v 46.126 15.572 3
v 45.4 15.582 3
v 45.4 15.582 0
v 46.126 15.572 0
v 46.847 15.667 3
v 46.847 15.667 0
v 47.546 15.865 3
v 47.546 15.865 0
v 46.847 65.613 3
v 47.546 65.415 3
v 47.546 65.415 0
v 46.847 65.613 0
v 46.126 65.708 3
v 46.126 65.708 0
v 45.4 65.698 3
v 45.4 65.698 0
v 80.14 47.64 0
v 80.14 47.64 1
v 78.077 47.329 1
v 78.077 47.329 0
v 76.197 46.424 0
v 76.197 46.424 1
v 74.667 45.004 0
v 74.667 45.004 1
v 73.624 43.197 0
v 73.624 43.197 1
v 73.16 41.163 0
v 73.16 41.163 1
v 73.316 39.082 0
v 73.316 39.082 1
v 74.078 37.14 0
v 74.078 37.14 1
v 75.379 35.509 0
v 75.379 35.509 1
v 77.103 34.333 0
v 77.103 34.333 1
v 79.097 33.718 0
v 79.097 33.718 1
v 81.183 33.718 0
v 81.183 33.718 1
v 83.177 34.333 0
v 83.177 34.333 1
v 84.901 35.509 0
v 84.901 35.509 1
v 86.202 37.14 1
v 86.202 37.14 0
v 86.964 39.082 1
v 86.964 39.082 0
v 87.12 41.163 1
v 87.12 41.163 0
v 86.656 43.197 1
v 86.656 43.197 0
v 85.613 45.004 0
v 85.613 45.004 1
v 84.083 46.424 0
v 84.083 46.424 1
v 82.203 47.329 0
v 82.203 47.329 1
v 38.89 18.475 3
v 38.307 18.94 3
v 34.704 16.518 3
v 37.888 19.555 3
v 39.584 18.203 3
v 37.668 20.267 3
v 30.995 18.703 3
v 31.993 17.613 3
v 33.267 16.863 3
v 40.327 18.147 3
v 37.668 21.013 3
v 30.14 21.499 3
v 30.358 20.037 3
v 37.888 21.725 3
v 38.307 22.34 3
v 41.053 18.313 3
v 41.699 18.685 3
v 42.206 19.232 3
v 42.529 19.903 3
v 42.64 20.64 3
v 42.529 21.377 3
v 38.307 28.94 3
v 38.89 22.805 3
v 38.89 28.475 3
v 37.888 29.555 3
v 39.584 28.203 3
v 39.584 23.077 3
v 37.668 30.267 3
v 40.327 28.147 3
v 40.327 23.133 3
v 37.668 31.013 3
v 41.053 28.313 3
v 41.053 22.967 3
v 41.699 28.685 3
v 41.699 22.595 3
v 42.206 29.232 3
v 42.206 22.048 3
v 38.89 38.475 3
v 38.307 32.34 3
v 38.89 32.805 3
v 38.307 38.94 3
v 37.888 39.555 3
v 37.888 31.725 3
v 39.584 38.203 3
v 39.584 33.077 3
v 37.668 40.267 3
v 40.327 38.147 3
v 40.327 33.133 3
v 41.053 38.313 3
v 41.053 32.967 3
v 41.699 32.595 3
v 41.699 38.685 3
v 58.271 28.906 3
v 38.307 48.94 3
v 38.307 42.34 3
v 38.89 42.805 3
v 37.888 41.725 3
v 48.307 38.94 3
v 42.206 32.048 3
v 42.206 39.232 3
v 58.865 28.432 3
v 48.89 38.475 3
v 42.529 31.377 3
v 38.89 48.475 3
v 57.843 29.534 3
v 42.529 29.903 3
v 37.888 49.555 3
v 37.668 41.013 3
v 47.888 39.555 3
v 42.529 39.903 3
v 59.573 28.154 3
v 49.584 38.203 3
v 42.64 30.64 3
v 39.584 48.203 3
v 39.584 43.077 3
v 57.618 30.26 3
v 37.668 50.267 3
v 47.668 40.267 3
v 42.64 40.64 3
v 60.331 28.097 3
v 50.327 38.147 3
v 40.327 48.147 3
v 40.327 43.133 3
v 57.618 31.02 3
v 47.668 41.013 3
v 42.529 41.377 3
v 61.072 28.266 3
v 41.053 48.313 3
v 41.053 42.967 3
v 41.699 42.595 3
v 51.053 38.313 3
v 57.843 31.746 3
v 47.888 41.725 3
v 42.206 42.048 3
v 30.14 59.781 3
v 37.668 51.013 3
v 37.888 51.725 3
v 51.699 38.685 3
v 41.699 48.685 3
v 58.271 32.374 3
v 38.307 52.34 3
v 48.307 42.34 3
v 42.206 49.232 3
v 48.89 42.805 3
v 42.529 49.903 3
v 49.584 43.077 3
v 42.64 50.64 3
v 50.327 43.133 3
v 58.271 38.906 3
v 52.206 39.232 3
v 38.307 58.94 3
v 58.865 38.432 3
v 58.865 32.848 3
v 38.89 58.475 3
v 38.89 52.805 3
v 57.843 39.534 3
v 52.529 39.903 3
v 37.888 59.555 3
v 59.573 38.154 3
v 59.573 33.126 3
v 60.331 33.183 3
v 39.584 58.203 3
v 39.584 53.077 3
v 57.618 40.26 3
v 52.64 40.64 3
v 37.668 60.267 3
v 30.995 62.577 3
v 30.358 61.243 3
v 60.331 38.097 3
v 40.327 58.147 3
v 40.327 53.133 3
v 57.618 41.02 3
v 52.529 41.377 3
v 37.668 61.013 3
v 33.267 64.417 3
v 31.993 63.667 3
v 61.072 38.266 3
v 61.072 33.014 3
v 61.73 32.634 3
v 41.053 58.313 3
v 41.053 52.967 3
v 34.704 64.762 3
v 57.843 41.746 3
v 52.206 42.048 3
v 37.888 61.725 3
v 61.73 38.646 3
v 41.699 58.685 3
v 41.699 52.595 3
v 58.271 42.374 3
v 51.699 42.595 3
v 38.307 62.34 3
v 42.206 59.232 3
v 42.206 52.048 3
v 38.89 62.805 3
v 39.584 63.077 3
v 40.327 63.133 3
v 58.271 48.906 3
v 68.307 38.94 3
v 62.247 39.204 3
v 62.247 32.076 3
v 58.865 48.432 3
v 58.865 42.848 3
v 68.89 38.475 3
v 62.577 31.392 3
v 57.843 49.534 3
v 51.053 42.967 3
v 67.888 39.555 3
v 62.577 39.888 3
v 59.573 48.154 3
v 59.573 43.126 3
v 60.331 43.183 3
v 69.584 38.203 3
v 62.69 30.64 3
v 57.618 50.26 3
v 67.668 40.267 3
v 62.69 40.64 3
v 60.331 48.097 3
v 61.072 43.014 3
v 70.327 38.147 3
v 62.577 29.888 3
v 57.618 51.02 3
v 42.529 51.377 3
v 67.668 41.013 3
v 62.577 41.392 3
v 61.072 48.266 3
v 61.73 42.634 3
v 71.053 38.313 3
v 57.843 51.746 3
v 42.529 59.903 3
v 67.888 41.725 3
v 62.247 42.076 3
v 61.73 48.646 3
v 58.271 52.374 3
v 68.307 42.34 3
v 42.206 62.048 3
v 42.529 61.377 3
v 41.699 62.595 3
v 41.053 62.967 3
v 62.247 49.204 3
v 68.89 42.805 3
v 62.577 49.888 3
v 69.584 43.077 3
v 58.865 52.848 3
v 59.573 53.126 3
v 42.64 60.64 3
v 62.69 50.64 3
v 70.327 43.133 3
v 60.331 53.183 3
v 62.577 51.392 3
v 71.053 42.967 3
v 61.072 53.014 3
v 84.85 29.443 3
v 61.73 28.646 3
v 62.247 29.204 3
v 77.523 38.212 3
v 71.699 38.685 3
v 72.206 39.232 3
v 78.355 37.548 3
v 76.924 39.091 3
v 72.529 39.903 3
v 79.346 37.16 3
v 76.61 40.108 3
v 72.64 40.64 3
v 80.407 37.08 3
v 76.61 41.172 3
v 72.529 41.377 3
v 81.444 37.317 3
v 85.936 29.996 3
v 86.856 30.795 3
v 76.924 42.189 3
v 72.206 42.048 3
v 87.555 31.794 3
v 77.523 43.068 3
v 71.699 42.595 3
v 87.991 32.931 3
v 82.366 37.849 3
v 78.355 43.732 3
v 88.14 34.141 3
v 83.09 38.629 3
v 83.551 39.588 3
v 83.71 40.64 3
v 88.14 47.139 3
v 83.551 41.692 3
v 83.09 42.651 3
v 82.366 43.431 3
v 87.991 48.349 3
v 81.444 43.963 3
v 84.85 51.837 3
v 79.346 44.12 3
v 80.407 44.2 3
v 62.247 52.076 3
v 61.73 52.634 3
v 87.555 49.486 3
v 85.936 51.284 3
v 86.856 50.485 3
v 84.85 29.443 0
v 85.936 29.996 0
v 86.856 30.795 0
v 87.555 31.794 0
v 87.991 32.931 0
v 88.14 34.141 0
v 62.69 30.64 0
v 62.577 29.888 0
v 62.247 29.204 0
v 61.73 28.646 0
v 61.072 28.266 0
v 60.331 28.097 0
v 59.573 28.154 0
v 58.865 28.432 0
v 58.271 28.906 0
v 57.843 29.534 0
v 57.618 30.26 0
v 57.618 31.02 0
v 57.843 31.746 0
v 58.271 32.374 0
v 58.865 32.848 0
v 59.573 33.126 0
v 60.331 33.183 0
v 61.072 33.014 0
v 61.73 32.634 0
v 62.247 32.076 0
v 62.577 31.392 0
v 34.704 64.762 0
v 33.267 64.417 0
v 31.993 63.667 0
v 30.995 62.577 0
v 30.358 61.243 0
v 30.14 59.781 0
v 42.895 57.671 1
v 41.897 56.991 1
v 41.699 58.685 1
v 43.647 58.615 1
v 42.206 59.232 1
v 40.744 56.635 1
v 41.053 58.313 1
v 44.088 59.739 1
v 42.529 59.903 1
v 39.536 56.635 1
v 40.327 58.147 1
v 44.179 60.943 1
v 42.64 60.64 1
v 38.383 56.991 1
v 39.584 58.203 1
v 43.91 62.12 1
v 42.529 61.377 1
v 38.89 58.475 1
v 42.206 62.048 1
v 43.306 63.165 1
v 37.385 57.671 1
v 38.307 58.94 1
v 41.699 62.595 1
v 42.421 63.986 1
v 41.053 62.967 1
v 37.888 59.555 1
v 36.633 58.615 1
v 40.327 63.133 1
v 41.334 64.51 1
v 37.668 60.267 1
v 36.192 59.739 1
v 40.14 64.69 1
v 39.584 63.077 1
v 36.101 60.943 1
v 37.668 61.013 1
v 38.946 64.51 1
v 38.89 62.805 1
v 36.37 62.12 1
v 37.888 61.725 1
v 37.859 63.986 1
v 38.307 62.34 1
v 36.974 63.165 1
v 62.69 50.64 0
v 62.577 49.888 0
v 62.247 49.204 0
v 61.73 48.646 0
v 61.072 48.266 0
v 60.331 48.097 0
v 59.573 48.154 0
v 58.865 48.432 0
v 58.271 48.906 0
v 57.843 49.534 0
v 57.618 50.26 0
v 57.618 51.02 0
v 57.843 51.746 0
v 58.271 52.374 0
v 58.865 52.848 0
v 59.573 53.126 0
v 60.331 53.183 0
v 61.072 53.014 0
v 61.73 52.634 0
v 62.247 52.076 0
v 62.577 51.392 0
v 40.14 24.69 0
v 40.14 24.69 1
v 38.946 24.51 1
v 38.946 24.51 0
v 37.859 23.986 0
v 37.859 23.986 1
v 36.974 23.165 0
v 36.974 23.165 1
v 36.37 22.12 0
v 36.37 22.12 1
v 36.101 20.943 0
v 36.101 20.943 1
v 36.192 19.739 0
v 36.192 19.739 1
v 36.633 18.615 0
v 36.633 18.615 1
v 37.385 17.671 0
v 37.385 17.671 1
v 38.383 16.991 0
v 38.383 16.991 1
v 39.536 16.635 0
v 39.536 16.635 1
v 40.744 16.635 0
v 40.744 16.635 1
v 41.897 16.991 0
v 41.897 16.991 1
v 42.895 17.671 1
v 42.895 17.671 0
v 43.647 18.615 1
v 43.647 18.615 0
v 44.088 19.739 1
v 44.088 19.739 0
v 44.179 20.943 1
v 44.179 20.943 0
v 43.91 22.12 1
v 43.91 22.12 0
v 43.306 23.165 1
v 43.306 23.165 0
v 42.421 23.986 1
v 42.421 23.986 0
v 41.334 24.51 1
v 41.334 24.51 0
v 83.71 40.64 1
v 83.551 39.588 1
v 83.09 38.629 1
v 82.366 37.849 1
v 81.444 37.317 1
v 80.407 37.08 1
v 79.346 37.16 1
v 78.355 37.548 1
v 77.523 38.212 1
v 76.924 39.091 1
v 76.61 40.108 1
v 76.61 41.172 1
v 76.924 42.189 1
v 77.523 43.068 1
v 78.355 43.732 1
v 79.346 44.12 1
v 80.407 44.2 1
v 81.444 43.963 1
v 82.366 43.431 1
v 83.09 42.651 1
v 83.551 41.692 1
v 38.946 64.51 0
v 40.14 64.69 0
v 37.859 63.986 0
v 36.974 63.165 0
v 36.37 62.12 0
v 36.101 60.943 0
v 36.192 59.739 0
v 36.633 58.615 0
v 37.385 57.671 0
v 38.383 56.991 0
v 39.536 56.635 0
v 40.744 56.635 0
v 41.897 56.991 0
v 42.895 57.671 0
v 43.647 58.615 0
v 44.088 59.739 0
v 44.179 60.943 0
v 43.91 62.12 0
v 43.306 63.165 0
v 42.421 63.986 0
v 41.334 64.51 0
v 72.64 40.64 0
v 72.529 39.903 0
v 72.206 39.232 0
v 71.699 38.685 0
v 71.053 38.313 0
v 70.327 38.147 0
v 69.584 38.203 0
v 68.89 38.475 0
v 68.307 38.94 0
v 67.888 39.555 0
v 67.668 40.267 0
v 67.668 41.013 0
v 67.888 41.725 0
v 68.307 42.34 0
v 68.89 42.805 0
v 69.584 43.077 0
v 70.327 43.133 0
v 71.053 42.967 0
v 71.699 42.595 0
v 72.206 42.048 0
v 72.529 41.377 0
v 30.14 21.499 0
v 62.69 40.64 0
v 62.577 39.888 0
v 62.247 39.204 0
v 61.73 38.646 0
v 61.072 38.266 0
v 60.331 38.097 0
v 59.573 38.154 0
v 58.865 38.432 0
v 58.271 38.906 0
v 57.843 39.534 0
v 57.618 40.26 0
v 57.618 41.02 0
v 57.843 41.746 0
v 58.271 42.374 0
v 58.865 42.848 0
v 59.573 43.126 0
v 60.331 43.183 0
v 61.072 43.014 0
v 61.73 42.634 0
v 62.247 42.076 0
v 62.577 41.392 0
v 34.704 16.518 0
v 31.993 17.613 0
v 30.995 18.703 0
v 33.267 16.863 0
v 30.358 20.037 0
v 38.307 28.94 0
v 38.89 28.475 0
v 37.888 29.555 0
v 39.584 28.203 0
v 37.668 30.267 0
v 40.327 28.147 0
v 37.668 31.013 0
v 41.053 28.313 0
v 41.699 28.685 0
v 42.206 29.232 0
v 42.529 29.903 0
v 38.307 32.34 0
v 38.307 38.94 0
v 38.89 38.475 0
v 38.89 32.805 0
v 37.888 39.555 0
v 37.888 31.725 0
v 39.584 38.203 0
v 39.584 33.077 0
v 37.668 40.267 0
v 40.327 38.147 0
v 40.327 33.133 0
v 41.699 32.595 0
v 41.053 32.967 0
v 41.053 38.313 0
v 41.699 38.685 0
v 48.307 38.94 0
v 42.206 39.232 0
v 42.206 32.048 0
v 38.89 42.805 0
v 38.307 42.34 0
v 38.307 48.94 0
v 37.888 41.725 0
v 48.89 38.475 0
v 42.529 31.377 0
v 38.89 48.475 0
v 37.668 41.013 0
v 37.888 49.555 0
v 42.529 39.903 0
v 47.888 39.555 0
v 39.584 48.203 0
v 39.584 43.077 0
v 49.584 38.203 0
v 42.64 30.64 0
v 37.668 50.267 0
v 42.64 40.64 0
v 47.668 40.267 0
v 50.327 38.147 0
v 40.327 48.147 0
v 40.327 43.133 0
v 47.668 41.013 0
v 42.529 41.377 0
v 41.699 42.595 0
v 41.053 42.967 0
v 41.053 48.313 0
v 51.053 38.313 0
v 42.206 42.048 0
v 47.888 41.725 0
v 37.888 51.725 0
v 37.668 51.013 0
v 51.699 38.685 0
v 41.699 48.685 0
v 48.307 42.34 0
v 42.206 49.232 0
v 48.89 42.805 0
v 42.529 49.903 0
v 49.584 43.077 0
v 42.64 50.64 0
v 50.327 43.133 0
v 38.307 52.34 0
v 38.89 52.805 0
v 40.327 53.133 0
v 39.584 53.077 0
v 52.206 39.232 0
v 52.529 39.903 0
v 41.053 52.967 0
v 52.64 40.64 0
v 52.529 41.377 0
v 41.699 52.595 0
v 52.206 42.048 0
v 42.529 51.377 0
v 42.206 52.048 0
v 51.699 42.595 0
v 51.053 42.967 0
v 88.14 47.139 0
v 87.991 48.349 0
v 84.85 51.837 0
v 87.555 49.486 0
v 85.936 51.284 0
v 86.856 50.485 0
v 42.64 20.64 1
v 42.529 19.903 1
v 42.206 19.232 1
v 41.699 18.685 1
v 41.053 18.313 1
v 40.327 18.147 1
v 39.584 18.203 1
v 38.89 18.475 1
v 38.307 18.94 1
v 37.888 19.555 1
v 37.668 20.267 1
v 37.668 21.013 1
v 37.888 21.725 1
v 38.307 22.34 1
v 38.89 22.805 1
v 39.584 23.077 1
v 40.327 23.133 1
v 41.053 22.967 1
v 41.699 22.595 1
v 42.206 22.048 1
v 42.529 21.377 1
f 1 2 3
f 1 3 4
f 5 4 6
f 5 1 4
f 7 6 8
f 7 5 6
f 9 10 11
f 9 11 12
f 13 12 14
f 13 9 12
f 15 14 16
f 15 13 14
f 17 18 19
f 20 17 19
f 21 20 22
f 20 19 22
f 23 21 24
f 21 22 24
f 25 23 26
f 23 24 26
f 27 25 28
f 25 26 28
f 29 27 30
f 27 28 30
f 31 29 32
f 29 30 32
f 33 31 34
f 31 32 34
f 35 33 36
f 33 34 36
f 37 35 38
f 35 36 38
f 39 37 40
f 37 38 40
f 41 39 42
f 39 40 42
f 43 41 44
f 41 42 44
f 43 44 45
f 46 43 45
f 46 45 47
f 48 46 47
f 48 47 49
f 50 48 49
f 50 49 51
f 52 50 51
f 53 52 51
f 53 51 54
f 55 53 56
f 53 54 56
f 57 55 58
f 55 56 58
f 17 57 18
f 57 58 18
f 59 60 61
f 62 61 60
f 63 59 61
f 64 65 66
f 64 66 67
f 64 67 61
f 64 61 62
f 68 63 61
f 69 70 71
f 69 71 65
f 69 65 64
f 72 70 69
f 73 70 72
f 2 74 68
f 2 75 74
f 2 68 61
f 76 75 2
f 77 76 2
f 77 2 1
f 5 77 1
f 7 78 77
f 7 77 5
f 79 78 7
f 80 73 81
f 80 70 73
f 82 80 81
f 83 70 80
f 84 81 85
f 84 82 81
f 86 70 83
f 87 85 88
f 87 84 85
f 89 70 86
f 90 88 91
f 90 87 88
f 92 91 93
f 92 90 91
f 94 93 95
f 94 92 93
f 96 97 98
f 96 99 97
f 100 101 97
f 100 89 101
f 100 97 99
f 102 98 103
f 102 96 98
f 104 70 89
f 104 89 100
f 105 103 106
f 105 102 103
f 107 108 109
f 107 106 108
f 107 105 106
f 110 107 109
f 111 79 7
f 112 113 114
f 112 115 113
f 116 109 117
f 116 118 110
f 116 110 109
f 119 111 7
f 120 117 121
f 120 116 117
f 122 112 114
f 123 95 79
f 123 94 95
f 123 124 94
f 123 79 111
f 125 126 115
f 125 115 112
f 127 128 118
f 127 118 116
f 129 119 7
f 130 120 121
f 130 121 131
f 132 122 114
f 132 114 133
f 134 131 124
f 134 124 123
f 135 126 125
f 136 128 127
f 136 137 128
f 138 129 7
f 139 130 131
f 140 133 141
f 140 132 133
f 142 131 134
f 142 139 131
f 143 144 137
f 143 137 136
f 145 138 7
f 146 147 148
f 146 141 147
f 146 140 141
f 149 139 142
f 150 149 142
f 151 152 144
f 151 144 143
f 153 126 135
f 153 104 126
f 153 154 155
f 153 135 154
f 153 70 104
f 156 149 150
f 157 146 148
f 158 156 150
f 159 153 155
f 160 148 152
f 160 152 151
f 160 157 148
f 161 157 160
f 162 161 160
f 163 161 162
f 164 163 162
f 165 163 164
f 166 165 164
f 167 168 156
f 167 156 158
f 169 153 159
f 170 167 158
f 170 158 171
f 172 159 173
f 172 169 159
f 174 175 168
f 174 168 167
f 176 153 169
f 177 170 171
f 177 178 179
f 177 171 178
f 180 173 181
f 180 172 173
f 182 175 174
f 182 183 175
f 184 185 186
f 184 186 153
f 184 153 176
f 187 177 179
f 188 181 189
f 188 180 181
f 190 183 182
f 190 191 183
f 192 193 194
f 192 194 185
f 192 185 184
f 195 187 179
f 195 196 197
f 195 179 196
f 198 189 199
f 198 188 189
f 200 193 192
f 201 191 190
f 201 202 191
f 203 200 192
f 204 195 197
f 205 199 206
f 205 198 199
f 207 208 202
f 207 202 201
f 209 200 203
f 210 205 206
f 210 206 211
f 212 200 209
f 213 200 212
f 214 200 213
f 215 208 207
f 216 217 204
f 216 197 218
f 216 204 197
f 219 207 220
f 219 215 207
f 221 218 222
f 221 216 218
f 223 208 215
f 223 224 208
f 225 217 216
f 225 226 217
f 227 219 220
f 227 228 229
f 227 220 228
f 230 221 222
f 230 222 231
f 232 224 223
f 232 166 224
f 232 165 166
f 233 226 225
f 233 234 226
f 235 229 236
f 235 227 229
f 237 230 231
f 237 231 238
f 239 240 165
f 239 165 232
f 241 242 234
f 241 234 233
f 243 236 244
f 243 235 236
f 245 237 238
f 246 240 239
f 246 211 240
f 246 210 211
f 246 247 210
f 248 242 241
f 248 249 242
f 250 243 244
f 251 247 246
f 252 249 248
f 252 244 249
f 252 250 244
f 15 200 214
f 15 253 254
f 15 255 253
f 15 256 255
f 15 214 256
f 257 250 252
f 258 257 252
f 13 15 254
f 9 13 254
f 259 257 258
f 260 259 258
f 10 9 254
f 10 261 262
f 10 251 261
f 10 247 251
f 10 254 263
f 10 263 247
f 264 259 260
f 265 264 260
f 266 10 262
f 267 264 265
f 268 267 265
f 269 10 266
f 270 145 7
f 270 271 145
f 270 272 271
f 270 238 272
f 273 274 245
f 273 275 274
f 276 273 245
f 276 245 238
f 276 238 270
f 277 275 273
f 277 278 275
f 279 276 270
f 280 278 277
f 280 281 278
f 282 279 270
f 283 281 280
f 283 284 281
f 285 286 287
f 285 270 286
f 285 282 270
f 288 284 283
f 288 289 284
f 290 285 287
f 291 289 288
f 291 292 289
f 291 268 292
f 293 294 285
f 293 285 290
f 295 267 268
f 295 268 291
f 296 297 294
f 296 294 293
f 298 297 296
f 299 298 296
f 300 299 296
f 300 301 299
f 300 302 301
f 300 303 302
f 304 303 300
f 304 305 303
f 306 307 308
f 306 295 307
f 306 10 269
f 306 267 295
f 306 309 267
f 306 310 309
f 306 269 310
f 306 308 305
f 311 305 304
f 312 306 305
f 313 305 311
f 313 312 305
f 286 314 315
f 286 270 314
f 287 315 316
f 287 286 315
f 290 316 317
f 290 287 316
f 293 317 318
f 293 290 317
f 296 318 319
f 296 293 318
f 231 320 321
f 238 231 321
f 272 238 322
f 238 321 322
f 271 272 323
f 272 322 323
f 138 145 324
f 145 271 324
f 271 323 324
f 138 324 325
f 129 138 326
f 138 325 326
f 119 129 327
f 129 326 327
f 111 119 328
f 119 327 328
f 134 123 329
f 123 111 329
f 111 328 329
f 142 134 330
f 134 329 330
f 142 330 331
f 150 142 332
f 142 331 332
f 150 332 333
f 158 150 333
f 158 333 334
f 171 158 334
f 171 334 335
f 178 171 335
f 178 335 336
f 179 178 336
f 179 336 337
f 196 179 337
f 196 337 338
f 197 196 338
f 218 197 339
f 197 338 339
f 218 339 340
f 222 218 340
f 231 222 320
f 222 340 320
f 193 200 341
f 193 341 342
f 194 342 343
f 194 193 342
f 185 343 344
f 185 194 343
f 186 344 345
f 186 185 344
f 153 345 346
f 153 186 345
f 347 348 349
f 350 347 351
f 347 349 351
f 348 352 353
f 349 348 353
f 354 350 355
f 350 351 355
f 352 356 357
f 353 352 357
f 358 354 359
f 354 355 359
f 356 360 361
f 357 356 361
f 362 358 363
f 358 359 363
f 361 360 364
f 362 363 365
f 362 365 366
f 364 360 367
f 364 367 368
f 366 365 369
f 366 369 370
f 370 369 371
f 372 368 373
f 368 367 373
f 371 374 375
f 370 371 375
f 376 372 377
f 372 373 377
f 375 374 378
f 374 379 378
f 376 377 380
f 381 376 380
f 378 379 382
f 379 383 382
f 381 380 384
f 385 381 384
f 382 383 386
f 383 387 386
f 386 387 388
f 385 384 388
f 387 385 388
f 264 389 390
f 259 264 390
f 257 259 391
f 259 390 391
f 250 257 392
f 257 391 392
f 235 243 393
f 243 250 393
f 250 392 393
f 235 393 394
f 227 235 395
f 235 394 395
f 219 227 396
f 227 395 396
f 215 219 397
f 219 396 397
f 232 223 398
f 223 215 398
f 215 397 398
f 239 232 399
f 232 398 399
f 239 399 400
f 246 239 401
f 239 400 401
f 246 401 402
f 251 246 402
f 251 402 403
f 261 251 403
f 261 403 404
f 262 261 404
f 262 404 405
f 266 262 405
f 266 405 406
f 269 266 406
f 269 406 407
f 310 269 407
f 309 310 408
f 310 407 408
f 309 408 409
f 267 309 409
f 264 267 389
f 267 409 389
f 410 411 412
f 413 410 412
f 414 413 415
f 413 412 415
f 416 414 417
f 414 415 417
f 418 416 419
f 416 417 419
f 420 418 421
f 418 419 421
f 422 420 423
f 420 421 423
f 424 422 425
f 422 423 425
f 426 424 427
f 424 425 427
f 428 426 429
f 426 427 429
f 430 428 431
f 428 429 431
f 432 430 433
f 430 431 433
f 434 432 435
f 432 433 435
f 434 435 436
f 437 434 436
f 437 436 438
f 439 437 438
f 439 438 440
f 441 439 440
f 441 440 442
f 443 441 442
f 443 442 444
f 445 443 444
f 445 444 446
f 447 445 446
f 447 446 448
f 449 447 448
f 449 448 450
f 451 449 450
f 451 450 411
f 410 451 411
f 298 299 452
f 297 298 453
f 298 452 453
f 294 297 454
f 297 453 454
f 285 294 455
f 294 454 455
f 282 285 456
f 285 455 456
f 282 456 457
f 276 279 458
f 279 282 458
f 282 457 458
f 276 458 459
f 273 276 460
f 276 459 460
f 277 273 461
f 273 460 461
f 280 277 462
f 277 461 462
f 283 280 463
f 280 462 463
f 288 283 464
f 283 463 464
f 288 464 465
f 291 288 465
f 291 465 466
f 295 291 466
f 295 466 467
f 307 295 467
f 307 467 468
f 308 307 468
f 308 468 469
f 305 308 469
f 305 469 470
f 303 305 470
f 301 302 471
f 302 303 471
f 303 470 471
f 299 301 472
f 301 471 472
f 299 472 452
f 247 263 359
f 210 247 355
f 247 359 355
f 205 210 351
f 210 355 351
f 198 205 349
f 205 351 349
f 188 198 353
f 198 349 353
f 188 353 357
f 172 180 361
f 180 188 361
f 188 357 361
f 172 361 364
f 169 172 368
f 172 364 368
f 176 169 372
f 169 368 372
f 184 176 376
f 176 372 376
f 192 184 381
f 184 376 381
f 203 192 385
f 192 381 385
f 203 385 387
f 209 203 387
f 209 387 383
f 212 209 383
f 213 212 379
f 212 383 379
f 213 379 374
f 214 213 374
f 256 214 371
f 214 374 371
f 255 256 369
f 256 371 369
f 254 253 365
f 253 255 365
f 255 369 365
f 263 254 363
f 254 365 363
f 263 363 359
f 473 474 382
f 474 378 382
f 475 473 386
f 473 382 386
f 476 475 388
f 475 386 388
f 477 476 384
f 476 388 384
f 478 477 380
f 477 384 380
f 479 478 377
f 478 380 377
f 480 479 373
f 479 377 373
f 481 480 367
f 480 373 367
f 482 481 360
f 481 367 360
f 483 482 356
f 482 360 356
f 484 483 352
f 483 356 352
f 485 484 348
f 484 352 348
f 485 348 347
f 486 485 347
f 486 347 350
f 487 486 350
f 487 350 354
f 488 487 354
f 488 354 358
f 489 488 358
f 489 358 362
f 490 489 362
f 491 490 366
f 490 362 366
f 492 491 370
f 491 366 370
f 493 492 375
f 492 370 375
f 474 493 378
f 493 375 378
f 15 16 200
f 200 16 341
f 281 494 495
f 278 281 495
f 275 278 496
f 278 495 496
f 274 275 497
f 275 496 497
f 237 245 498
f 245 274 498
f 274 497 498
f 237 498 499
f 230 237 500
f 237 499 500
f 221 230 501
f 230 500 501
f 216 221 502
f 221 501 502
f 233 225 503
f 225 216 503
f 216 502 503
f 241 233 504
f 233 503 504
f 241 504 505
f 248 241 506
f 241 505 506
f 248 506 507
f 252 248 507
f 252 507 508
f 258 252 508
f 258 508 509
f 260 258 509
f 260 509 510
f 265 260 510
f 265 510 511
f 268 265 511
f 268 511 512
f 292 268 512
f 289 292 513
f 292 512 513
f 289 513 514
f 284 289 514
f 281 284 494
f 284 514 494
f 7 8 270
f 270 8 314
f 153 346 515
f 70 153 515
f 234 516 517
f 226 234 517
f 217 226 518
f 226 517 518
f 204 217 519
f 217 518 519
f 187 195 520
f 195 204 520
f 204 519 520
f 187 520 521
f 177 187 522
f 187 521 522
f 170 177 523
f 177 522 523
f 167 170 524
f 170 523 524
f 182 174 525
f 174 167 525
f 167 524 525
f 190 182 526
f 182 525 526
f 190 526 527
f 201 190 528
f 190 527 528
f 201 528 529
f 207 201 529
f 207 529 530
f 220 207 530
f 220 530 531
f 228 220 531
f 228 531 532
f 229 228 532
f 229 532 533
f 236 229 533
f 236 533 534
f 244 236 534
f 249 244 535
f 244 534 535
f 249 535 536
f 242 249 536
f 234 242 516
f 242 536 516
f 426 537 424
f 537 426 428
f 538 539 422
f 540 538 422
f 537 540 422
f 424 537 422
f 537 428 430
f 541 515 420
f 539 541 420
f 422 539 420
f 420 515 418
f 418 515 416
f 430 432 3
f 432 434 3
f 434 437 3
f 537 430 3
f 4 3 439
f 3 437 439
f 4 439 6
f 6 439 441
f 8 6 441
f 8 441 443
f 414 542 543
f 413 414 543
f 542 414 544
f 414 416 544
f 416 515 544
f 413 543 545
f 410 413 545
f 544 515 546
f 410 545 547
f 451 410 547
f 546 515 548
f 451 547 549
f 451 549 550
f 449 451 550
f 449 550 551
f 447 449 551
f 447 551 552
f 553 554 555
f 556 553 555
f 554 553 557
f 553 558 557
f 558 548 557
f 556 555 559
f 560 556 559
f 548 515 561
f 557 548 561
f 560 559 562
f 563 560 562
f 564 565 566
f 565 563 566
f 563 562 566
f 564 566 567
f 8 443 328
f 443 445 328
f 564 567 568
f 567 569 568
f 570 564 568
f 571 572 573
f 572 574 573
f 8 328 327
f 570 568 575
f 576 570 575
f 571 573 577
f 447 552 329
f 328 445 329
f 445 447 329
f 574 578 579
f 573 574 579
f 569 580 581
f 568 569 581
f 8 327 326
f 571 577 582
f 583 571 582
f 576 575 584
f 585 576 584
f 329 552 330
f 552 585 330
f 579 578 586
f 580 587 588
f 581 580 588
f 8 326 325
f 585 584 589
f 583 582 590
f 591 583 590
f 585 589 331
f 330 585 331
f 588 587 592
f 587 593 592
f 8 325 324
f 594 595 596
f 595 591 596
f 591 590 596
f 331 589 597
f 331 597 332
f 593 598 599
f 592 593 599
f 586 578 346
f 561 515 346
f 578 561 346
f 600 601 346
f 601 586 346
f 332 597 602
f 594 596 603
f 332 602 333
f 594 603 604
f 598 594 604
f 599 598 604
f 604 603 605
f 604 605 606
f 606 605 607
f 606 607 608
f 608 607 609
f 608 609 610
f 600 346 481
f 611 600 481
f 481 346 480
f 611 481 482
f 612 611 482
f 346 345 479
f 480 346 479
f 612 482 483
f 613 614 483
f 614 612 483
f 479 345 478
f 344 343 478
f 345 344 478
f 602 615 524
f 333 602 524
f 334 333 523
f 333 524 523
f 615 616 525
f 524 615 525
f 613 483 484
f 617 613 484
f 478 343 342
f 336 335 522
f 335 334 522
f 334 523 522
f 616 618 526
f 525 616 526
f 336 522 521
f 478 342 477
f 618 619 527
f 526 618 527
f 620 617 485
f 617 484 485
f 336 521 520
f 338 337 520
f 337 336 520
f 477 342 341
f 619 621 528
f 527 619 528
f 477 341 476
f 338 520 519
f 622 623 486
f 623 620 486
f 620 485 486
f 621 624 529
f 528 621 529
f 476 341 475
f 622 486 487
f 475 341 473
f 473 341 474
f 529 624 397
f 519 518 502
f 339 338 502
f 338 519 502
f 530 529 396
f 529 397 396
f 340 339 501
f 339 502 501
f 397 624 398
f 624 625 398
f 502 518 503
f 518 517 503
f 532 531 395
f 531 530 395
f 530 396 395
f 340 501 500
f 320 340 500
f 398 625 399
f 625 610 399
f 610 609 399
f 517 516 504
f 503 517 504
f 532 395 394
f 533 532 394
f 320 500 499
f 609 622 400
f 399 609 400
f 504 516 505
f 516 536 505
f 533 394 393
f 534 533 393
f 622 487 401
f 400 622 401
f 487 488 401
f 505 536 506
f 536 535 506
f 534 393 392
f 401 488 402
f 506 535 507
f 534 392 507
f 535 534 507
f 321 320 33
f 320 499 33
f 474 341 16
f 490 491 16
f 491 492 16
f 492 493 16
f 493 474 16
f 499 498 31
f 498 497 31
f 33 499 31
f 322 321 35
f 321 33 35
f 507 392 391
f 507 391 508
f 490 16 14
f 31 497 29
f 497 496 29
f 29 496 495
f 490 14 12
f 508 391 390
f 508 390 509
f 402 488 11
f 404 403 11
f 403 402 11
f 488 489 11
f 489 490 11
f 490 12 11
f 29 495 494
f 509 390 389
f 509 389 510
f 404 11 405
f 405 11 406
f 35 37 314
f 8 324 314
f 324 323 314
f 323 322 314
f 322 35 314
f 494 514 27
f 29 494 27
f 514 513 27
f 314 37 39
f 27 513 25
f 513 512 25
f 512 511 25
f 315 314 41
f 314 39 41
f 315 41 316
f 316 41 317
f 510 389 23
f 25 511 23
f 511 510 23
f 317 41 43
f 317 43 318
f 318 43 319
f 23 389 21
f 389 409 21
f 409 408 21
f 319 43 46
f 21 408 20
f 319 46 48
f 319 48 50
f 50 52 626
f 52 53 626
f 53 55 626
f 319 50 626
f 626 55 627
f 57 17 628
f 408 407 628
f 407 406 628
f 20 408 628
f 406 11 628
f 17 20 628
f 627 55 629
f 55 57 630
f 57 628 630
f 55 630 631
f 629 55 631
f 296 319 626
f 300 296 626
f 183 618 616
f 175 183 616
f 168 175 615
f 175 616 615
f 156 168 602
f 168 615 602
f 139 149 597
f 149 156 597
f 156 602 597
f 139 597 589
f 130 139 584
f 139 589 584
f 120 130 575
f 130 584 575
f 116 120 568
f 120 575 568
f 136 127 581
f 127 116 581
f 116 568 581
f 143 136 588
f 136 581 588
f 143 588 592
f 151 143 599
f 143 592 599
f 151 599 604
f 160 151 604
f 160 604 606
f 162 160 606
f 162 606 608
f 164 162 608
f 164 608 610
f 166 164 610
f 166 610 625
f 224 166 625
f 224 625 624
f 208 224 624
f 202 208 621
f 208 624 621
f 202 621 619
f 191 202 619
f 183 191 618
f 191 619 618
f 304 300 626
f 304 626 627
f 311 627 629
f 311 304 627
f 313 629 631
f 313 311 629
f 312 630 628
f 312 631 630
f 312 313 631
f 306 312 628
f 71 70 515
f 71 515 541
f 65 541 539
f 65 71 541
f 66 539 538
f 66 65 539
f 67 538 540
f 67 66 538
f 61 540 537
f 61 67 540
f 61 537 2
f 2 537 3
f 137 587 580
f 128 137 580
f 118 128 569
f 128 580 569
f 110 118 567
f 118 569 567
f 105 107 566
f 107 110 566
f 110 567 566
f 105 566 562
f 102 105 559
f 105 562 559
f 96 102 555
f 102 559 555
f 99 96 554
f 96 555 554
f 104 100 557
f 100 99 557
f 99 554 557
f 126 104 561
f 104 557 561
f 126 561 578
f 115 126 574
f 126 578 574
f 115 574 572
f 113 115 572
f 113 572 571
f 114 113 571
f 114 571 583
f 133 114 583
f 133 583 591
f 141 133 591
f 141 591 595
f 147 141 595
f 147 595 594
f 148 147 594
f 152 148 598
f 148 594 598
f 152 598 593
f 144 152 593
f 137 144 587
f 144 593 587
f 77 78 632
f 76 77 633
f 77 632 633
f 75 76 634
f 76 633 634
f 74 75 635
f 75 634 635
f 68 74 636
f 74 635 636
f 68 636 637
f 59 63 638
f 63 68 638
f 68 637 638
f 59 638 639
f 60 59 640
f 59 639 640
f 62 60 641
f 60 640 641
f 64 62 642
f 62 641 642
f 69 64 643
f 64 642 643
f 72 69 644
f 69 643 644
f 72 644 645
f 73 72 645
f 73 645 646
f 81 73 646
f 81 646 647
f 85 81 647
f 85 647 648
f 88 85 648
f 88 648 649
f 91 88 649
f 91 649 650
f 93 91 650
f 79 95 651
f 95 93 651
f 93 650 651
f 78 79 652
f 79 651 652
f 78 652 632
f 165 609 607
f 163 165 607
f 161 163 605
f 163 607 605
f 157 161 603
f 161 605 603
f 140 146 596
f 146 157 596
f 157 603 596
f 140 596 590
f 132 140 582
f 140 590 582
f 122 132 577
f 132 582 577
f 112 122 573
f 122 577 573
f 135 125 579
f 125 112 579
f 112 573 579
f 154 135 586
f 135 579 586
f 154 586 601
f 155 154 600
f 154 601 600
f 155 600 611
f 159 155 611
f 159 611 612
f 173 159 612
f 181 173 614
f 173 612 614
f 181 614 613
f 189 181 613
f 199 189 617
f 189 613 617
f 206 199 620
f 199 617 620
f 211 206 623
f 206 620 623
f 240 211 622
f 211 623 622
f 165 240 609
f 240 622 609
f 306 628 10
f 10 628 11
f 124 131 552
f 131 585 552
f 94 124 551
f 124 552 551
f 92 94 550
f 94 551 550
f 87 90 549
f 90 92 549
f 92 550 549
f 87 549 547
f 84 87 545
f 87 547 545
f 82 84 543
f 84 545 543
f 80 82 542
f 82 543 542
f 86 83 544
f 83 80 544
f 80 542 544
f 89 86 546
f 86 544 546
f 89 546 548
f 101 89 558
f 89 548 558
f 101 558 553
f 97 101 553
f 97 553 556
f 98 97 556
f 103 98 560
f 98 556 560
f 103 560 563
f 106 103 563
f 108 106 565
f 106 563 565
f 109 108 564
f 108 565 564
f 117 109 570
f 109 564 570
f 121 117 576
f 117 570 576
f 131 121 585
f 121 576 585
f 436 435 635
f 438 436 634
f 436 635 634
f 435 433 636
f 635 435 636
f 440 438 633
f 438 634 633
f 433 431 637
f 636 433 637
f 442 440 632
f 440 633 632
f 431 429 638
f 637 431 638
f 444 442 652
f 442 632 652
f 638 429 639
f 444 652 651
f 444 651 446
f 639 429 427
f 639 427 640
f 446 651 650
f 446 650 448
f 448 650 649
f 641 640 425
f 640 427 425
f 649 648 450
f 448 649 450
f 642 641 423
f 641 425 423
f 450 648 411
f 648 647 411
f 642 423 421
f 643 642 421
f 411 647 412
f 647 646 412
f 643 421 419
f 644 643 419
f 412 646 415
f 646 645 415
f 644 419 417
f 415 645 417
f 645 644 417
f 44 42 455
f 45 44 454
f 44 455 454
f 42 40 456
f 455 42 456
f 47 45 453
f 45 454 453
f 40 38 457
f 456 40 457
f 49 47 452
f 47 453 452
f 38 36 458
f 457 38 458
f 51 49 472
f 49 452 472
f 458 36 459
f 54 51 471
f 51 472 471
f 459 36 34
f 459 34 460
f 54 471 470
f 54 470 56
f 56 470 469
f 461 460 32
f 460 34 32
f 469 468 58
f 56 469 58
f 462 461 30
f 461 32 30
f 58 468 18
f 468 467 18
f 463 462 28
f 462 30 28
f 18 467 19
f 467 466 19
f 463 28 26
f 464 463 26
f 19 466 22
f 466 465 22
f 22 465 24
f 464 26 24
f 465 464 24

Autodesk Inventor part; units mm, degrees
ref_plane "YZ Plane" through (0, 0, 0) normal (1, 0, 0) x (0, 1, 0)
ref_plane "XZ Plane" through (0, 0, 0) normal (0, 1, 0) x (-1, 0, 0)
ref_plane "XY Plane" through (0, 0, 0) normal (0, 0, 1) x (1, 0, 0)
sketch "Sketch1" plane through (0, 0, 0) normal (0, 0, 1) x (1, 0, 0)
  circle A0 centre (80.14, 40.64) radius 3.57 projected
  circle A1 centre (40.14, 40.64) radius 2.5 projected
  circle A2 centre (40.14, 50.64) radius 2.5 projected
  circle A3 centre (40.14, 60.64) radius 2.5 projected
  circle A4 centre (40.14, 30.64) radius 2.5 projected
  circle A5 centre (40.14, 20.64) radius 2.5 projected
  circle A6 centre (7.59, 40.64) radius 12.5 projected
  arc A7 (-4.314, 26.544) -> (-6.506, 28.736) centre (-5.41, 27.64) ccw projected
  line L0 (-6.814, 24.044) -> (-4.314, 26.544) projected
  arc A8 (-9.006, 26.236) -> (-6.814, 24.044) centre (-7.91, 25.14) ccw projected
  line L1 (-6.506, 28.736) -> (-9.006, 26.236) projected
  line L2 (-4.314, 54.736) -> (-6.814, 57.236) projected
  arc A9 (-6.506, 52.544) -> (-4.314, 54.736) centre (-5.41, 53.64) ccw projected
  line L3 (-9.006, 55.044) -> (-6.506, 52.544) projected
  arc A10 (-6.814, 57.236) -> (-9.006, 55.044) centre (-7.91, 56.14) ccw projected
  line L4 (21.994, 57.236) -> (19.494, 54.736) projected
  arc A11 (19.494, 54.736) -> (21.686, 52.544) centre (20.59, 53.64) ccw projected
  line L5 (21.686, 52.544) -> (24.186, 55.044) projected
  arc A12 (24.186, 55.044) -> (21.994, 57.236) centre (23.09, 56.14) ccw projected
  line L6 (24.186, 26.236) -> (21.686, 28.736) projected
  arc A13 (21.686, 28.736) -> (19.494, 26.544) centre (20.59, 27.64) ccw projected
  line L7 (19.494, 26.544) -> (21.994, 24.044) projected
  arc A14 (21.994, 24.044) -> (24.186, 26.236) centre (23.09, 25.14) ccw projected
  circle A15 centre (60.14, 40.64) radius 2.55 projected
  circle A16 centre (60.14, 30.64) radius 2.55 projected
  circle A17 centre (70.14, 40.64) radius 2.5 projected
  circle A18 centre (60.14, 50.64) radius 2.55 projected
  circle A19 centre (50.14, 40.64) radius 2.5 projected
  line L8 (-12.41, 60.64) -> (-12.41, 20.64)
  line L9 (-12.41, 20.64) -> (46.5039, 15.4857)
  line L10 (46.5039, 15.4857) -> (88.14, 30.64)
  line L11 (88.14, 30.64) -> (88.14, 50.64)
  line L12 (88.14, 50.64) -> (46.5039, 65.7943)
  line L13 (46.5039, 65.7943) -> (-12.41, 60.64)
  point P0 (0, 0)
  dimension "d0" = 40
  dimension "d1" = 20
  dimension "d2" = 20
  dimension "d3" = 8
  dimension "d4" = 10
  dimension "d5" = 20
  dimension "d6" = 95
  dimension "d7" = 95
  dimension "d8" = 110
  dimension "d9" = 110
extrude "Extrusion1" add sketch "Sketch1" along normal blind 3
fillet "Fillet1" radius 5 6 edges at (-12.41, 20.64, 1.5) (46.5039, 15.4857, 1.5) (-12.41, 60.64, 1.5) (46.5039, 65.7943, 1.5) (88.14, 50.64, 1.5) (88.14, 30.64, 1.5)
sketch "Sketch2" plane through (0, 0, 0) normal (0, 0, -1) x (-1, 0, 0)
  circle A0 centre (-40.14, 20.64) radius 2.5 projected
  circle A1 centre (-80.14, 40.64) radius 3.57 projected
  circle A2 centre (-40.14, 60.64) radius 2.5 projected
  point P0 (0, 0)
hole "Hole1" at (40.14, 20.64, 0) at (40.14, 60.64, 0) direction (0, 0, 1) diameter 8.1 depth 1
sketch "Sketch3" plane through (0, 0, 0) normal (0, 0, -1) x (-1, 0, 0)
  circle A0 centre (-80.14, 40.64) radius 3.57 projected
  point P0 (0, 0)
hole "Hole2" at (80.14, 40.64, 0) direction (0, 0, 1) diameter 14 depth 1
sketch "Sketch4" plane through (0, 0, 0) normal (0, 0, -1) x (-1, 0, 0)
  circle A0 centre (-80.14, 40.64) radius 7 projected
  circle A1 centre (-40.14, 20.64) radius 4.05 projected
  circle A2 centre (-40.14, 60.64) radius 4.05 projected
  circle A3 centre (-7.59, 40.64) radius 12.5 projected
  circle A4 centre (-60.14, 50.64) radius 2.55 projected
  circle A5 centre (-60.14, 30.64) radius 2.55 projected
  circle A6 centre (-60.14, 40.64) radius 2.55 projected
  circle A7 centre (-50.14, 40.64) radius 2.5 projected
  circle A8 centre (-70.14, 40.64) radius 2.5 projected
  circle A9 centre (-40.14, 30.64) radius 2.5 projected
  circle A10 centre (-40.14, 50.64) radius 2.5 projected
  circle A11 centre (-40.14, 40.64) radius 2.5 projected
  arc A12 (-24.186, 26.236) -> (-21.994, 24.044) centre (-23.09, 25.14) ccw projected
  line L0 (-24.186, 26.236) -> (-21.686, 28.736) projected
  arc A13 (-19.494, 26.544) -> (-21.686, 28.736) centre (-20.59, 27.64) ccw projected
  line L1 (-19.494, 26.544) -> (-21.994, 24.044) projected
  arc A14 (-21.994, 57.236) -> (-24.186, 55.044) centre (-23.09, 56.14) ccw projected
  line L2 (-21.994, 57.236) -> (-19.494, 54.736) projected
  arc A15 (-21.686, 52.544) -> (-19.494, 54.736) centre (-20.59, 53.64) ccw projected
  line L3 (-21.686, 52.544) -> (-24.186, 55.044) projected
  arc A16 (4.314, 54.736) -> (6.506, 52.544) centre (5.41, 53.64) ccw projected
  line L4 (4.314, 54.736) -> (6.814, 57.236) projected
  arc A17 (9.006, 55.044) -> (6.814, 57.236) centre (7.91, 56.14) ccw projected
  line L5 (9.006, 55.044) -> (6.506, 52.544) projected
  line L6 (6.814, 24.044) -> (4.314, 26.544) projected
  arc A18 (6.506, 28.736) -> (4.314, 26.544) centre (5.41, 27.64) ccw projected
  line L7 (6.506, 28.736) -> (9.006, 26.236) projected
  arc A19 (6.814, 24.044) -> (9.006, 26.236) centre (7.91, 25.14) ccw projected
  arc A20 (-88.14, 34.141) -> (-84.8501, 29.4426) centre (-83.14, 34.141) ccw projected
  line L8 (-47.5455, 15.8648) -> (-84.8501, 29.4426) projected
  arc A21 (-47.5455, 15.8648) -> (-45.3997, 15.5823) centre (-45.8354, 20.5633) ccw projected
  line L9 (7.8458, 20.2407) -> (-45.3997, 15.5823) projected
  arc A22 (7.8458, 20.2407) -> (12.41, 25.2217) centre (7.41, 25.2217) ccw projected
  line L10 (12.41, 56.0583) -> (12.41, 25.2217) projected
  arc A23 (12.41, 56.0583) -> (7.8458, 61.0393) centre (7.41, 56.0583) ccw projected
  line L11 (-45.3997, 65.6977) -> (7.8458, 61.0393) projected
  arc A24 (-45.3997, 65.6977) -> (-47.5455, 65.4152) centre (-45.8354, 60.7167) ccw projected
  line L12 (-84.8501, 51.8374) -> (-47.5455, 65.4152) projected
  arc A25 (-84.8501, 51.8374) -> (-88.14, 47.139) centre (-83.14, 47.139) ccw projected
  line L13 (-88.14, 34.141) -> (-88.14, 47.139) projected
  line L14 (-45.3997, 65.6977) -> (7.8458, 61.0393) projected
  line L15 (-30.14, 64.3626) -> (-30.14, 16.9174)
  point P0 (0, 0)
  dimension "d27" = 10
extrude "Extrusion2" cut sketch "Sketch4" against normal through all contours L15 L11 A23 L10 A22 L9
fillet "Fillet2" radius 5 2 edges at (30.14, 16.9174, 1.5) (30.14, 64.3626, 1.5)
equation "\"d7\" = d6"
properties part number "2020 Slider" material "Aluminum 6061"
